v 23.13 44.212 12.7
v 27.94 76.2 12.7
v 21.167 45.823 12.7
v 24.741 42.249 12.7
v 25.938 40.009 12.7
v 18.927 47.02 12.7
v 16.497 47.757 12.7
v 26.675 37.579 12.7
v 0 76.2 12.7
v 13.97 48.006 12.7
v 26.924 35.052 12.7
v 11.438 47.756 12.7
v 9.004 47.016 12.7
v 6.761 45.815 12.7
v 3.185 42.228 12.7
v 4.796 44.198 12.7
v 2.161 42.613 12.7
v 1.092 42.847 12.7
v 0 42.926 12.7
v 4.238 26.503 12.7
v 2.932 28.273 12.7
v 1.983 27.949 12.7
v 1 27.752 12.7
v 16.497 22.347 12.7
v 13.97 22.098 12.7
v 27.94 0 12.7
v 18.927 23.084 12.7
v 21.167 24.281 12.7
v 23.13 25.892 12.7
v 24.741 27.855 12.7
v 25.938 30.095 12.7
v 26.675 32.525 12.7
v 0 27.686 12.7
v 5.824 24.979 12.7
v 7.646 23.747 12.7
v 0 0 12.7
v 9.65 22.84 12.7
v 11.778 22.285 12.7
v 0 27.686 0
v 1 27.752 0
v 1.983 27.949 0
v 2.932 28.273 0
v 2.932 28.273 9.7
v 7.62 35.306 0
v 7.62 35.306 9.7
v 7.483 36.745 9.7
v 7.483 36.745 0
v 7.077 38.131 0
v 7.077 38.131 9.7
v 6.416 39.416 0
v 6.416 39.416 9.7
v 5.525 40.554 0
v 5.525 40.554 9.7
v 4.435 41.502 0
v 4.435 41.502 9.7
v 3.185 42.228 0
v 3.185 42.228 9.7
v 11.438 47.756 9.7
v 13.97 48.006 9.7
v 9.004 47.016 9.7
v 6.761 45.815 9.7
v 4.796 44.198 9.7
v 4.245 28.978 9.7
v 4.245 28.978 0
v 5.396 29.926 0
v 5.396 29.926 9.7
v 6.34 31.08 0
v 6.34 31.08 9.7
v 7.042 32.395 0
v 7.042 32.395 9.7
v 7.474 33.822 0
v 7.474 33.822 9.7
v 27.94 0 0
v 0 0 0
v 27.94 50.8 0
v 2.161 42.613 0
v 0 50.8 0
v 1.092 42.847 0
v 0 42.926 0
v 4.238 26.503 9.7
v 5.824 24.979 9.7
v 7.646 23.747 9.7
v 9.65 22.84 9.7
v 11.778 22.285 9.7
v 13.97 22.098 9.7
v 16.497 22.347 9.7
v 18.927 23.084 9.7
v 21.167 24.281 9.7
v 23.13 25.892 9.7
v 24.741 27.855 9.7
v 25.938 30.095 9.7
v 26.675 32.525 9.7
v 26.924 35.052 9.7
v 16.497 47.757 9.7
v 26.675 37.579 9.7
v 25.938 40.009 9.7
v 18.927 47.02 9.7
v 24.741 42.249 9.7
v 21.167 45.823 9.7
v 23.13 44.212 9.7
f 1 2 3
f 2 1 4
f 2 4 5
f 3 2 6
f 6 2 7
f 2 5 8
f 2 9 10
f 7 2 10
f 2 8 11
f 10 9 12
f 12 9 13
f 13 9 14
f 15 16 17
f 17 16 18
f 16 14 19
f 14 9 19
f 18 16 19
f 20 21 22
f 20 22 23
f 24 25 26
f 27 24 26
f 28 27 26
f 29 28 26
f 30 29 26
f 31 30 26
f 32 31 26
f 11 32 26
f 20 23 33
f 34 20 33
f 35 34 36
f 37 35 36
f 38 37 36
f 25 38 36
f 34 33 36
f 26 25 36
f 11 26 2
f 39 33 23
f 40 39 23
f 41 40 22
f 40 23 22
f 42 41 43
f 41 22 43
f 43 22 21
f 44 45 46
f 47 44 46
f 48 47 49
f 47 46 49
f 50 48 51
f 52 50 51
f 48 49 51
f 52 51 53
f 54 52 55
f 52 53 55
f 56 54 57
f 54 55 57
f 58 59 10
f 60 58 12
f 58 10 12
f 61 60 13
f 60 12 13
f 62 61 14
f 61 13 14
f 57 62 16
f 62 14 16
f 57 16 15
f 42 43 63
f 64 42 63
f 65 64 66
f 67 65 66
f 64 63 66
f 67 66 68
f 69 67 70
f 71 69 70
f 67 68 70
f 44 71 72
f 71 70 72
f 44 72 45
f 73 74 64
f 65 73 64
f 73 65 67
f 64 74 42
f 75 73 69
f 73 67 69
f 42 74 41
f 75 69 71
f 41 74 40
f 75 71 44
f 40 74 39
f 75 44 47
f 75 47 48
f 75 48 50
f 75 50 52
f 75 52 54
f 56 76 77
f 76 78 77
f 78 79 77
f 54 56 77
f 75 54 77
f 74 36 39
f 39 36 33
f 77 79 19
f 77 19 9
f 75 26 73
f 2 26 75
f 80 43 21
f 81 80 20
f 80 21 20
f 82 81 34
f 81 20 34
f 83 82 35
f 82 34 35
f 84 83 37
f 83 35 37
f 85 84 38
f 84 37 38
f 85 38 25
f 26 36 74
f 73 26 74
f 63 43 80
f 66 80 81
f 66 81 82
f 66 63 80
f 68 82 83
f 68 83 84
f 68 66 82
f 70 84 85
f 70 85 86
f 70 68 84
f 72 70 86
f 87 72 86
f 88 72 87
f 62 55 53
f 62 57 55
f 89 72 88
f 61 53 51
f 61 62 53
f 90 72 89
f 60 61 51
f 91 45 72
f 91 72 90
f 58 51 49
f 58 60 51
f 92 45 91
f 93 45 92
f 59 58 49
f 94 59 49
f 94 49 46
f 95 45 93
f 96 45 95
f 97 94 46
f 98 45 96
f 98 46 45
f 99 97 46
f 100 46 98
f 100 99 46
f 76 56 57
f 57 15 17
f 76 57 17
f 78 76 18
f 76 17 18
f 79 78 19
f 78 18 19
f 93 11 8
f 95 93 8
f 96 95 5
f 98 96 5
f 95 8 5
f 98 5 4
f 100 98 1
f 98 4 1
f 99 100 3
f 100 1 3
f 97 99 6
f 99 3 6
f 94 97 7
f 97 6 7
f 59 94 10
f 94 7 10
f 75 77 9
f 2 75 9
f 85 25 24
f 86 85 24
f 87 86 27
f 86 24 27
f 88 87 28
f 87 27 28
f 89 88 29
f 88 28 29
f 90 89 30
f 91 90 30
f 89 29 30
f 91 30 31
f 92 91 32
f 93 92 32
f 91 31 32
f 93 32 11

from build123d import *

# Parameters (mm, degrees)
F1_DEPTH = 27.94
F3_DEPTH = 3
F5_DEPTH = 25.4


with BuildPart() as f1:
    # F0 (on Right) → F1 (new body)
    with BuildSketch(Plane.YZ):
        Polygon((0, 12.7), (0, 0), (50.8, 0), (76.2, 12.7), align=None)
    extrude(amount=F1_DEPTH)

    # F2 (on face) → F3 (cut)
    with BuildSketch(Plane.XY.offset(12.7)):
        with BuildLine():
            ThreePointArc((13.97, 48.006), (1.016, 35.052), (13.97, 22.098))
            Line((13.97, 22.098), (13.97, 48.006))
        make_face()
        with BuildLine():
            Line((13.97, 48.006), (13.97, 22.098))
            ThreePointArc((13.97, 22.098), (23.1298612435, 25.8921387565), (26.924, 35.052))
            ThreePointArc((26.924, 35.052), (23.1298612435, 44.2118612435), (13.97, 48.006))
        make_face()
    extrude(amount=-F3_DEPTH, mode=Mode.SUBTRACT)

    # F4 (on face) → F5 (cut)
    with BuildSketch(Plane.XY.offset(12.7)):
        with BuildLine():
            ThreePointArc((2.9316641234, 28.2725267849), (1.0181406263, 35.2874883522), (3.1854046142, 42.2282537835))
            ThreePointArc((3.1854046142, 42.2282537835), (1.6304640704, 42.7495197934), (0, 42.926))
            Line((0, 42.926), (0, 27.686))
            ThreePointArc((0, 27.686), (1.4948802796, 27.8340703329), (2.9316641234, 28.2725267849))
        make_face()
        with BuildLine():
            ThreePointArc((2.9316641234, 28.2725267849), (6.3404921189, 31.0795878466), (7.62, 35.306))
            ThreePointArc((7.62, 35.306), (6.4162755225, 39.4164511212), (3.1854046142, 42.2282537835))
            ThreePointArc((3.1854046142, 42.2282537835), (1.0181406263, 35.2874883522), (2.9316641234, 28.2725267849))
        make_face()
    extrude(amount=-F5_DEPTH, mode=Mode.SUBTRACT)


solid = f1.part
